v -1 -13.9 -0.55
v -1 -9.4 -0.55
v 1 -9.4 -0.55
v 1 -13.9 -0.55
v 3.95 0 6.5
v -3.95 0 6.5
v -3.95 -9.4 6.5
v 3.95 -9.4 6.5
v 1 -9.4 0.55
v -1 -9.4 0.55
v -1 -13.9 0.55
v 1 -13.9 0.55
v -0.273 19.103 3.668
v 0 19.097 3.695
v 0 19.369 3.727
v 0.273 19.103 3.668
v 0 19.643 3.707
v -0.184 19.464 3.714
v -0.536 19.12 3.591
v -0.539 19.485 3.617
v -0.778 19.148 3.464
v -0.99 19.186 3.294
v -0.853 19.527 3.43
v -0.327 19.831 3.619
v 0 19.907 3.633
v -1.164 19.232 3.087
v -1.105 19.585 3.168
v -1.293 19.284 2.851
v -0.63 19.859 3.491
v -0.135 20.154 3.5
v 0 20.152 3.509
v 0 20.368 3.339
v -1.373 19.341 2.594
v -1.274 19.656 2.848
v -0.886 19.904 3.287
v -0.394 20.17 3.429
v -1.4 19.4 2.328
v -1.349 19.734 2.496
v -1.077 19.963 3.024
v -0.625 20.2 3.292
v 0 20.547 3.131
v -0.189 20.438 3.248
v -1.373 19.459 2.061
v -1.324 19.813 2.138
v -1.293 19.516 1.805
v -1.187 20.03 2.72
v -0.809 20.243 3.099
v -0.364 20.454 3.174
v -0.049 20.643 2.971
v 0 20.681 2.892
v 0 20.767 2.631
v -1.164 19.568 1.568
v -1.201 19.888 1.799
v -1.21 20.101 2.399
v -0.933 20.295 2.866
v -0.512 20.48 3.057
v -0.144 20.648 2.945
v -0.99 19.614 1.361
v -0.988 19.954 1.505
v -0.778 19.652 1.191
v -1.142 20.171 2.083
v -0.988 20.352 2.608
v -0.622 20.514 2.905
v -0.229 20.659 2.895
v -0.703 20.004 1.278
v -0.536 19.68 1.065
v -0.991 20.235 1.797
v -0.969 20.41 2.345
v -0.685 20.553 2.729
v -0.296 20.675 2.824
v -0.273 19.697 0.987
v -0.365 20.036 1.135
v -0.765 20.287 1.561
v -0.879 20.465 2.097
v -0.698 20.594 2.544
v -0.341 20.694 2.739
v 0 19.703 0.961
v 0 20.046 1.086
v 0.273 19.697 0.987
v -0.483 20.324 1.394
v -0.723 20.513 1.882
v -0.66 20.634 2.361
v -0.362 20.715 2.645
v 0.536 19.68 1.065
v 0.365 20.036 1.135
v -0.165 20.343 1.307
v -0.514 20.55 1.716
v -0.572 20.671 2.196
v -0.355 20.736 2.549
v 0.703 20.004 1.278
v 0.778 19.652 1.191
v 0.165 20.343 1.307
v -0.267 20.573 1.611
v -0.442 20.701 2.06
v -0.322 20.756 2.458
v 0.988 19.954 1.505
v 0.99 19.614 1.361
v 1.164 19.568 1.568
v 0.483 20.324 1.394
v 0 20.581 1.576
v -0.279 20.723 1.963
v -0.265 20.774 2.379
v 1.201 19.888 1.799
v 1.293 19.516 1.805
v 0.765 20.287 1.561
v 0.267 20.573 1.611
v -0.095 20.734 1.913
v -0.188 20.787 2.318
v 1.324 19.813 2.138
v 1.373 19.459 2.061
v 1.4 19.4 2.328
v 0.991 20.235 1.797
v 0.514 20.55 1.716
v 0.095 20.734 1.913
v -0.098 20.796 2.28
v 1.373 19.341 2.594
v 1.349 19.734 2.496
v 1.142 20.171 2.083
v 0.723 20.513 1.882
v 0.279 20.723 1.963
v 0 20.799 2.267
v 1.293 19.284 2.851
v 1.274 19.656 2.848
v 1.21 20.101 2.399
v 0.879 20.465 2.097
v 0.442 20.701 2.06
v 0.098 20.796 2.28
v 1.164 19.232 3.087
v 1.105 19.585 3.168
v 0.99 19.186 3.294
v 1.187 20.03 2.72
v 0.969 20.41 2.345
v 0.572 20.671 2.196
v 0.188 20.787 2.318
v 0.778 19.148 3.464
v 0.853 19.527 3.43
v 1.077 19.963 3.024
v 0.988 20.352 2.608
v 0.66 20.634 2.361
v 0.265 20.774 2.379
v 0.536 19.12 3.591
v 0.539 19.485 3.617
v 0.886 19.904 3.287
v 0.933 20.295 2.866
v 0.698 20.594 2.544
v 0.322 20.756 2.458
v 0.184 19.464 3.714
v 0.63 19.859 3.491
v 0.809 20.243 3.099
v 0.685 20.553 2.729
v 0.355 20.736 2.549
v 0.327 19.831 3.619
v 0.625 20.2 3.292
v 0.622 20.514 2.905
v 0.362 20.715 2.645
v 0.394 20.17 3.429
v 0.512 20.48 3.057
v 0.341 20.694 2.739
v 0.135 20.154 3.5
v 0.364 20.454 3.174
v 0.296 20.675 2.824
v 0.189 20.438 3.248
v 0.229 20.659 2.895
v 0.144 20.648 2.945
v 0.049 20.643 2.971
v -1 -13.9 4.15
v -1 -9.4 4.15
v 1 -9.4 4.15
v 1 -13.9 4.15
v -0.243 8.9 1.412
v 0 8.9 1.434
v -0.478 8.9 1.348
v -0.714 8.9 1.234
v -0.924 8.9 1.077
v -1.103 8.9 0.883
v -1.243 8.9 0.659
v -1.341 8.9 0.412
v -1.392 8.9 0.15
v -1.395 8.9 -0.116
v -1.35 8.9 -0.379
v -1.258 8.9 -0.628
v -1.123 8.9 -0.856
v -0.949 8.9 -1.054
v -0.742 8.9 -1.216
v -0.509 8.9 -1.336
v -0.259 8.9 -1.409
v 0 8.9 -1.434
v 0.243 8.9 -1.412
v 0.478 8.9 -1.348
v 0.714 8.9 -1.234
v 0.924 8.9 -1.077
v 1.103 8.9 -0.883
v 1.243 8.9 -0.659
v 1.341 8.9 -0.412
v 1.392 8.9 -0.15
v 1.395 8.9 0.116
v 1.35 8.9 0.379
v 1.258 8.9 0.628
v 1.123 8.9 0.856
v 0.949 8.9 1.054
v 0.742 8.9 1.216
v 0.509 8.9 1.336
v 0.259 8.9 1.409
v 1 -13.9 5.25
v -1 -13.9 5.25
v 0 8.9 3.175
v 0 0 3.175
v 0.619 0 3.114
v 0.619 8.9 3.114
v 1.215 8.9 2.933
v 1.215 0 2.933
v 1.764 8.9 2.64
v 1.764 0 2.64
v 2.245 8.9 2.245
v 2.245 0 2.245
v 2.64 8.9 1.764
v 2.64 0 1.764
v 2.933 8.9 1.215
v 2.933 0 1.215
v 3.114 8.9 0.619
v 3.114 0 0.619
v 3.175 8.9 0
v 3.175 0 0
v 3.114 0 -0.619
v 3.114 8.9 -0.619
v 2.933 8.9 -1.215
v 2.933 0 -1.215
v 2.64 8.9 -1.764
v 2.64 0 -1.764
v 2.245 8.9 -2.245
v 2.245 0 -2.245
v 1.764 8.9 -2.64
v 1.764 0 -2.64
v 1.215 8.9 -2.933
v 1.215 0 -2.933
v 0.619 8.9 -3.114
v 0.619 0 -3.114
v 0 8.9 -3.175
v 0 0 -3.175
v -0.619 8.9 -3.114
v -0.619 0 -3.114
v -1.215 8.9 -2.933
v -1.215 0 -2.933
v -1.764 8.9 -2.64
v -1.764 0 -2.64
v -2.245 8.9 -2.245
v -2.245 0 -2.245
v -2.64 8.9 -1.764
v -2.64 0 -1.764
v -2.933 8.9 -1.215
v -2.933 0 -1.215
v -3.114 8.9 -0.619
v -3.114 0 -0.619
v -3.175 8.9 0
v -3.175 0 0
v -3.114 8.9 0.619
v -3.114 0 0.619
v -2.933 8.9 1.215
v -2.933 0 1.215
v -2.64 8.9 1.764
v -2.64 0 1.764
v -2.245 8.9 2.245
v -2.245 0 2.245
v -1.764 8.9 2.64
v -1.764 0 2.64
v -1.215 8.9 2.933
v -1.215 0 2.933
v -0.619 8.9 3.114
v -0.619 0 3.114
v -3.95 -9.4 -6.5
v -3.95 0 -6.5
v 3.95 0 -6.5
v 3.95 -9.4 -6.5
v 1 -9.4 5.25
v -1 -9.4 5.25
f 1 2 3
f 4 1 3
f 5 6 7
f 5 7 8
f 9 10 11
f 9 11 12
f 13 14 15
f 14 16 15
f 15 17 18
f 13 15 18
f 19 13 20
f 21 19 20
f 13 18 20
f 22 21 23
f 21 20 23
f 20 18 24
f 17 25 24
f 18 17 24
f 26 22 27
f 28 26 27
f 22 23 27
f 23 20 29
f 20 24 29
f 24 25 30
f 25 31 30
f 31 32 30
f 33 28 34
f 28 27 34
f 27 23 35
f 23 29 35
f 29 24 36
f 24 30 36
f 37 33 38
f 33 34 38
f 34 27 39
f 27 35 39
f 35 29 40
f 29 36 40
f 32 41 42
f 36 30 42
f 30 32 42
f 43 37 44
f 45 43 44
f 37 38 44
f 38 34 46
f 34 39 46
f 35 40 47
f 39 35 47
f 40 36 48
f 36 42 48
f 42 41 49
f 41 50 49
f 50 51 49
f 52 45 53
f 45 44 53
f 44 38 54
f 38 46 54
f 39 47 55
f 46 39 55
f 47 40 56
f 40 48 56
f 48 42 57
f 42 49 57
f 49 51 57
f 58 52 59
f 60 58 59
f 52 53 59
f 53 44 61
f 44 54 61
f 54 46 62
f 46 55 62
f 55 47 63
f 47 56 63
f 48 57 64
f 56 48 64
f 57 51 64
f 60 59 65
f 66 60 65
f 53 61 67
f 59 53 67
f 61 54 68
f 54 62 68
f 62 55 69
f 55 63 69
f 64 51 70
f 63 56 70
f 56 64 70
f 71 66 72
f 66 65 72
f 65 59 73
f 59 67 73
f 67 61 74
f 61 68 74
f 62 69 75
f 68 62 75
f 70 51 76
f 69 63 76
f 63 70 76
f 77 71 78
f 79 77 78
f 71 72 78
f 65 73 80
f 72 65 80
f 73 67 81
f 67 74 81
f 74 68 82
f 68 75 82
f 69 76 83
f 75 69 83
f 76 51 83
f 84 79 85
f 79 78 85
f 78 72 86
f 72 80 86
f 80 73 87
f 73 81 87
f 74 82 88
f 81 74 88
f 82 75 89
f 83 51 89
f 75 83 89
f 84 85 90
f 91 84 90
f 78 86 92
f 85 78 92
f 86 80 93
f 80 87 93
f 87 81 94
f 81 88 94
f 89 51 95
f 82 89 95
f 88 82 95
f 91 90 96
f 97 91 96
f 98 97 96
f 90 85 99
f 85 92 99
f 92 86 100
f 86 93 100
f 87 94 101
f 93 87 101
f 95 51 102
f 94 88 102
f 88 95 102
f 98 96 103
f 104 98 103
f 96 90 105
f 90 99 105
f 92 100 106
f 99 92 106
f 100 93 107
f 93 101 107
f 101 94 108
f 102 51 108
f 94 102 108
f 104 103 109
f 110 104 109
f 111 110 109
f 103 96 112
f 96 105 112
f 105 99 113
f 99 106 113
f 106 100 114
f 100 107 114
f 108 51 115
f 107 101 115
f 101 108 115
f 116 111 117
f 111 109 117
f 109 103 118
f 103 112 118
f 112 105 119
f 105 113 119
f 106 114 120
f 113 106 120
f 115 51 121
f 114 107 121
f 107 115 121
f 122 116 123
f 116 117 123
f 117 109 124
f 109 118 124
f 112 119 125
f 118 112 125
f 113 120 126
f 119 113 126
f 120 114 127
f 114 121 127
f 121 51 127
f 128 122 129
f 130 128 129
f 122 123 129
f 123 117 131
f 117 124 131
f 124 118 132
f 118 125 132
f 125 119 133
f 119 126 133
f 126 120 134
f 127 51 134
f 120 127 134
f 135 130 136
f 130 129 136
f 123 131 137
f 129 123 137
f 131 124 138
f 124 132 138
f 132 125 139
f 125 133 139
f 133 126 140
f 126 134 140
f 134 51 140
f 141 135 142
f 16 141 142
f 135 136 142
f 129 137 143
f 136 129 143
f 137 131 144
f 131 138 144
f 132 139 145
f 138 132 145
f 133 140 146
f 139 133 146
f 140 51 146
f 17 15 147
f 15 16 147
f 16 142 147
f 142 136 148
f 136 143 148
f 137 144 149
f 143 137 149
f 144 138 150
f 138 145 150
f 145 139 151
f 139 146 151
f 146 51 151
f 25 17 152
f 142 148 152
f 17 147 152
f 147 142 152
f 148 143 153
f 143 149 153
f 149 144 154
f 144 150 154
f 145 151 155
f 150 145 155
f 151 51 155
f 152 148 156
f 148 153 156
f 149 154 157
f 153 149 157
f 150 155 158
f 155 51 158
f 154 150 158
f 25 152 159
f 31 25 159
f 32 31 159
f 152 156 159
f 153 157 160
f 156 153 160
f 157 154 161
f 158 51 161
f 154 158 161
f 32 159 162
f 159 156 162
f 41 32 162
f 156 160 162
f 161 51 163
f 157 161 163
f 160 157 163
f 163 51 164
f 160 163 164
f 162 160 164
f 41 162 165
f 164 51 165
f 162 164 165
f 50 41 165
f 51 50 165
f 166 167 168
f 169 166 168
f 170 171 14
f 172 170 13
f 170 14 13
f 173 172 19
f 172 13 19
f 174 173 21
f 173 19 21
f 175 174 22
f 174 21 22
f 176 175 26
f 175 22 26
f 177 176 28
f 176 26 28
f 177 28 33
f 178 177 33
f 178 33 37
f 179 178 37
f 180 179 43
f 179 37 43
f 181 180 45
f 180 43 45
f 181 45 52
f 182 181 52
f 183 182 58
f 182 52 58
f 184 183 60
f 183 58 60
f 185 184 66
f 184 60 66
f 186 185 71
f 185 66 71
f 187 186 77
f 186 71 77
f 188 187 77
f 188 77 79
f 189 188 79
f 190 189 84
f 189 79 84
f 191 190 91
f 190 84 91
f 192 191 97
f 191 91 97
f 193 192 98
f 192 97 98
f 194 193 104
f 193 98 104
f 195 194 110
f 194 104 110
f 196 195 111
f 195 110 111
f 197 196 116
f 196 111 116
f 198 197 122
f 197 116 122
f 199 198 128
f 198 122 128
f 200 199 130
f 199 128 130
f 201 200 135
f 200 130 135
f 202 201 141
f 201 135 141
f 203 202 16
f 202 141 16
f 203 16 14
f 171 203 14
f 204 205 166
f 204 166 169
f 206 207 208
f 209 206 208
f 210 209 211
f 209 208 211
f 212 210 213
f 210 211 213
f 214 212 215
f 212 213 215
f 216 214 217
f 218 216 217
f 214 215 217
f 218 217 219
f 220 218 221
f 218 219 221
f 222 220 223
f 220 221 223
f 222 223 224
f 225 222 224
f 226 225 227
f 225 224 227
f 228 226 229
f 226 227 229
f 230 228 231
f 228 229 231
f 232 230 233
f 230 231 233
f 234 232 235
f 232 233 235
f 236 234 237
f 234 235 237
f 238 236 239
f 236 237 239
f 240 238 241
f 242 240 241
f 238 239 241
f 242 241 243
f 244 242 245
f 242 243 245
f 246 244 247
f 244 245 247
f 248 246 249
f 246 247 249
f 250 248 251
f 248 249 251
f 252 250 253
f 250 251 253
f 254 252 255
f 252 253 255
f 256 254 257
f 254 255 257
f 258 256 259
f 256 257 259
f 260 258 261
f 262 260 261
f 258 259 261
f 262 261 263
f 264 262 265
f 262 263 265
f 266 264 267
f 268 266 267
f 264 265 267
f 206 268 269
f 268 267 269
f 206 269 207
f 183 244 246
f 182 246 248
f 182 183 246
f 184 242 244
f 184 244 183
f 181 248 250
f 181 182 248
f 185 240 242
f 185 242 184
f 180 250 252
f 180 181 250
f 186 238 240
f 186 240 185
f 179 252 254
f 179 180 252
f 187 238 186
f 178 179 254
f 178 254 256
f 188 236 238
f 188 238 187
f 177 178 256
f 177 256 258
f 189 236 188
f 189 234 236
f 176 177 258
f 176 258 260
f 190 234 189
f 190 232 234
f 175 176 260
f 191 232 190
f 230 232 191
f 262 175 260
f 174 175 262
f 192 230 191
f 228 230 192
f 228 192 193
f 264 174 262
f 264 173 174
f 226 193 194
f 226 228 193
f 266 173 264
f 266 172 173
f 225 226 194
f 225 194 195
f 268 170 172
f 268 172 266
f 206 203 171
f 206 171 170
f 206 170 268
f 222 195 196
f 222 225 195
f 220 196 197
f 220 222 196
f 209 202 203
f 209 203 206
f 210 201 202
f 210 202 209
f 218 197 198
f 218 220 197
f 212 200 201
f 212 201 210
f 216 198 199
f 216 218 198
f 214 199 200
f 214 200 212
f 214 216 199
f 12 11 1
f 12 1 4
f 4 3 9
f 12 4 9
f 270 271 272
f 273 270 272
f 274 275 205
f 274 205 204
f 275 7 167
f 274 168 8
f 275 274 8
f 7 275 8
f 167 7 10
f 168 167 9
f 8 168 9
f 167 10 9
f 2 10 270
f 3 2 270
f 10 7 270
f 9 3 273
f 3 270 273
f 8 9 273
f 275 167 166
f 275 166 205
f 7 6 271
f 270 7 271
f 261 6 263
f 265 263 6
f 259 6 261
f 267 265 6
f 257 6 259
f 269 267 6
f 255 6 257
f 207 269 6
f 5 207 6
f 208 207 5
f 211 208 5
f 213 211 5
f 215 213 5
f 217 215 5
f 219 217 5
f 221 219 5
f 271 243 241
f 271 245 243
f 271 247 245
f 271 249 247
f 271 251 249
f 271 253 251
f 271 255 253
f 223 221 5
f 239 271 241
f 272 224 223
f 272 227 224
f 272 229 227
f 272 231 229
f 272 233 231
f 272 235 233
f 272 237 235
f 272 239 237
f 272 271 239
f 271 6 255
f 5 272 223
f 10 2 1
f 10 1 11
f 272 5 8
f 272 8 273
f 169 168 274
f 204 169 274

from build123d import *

# Parameters (mm, degrees)
SKETCH1_W           = 7.9
SKETCH1_H           = 13
BOSS_EXTRUDE1_DEPTH = 9.4
SKETCH2_W           = 2
SKETCH2_H           = 1.1
BOSS_EXTRUDE2_DEPTH = 4.5
SKETCH3_R           = 3.175
BOSS_EXTRUDE3_DEPTH = 8.9


with BuildPart() as part:
    # Sketch1 → Boss-Extrude1 (new body)
    with BuildSketch(Plane(origin=(0, 0, 0), x_dir=(1, 0, 0), z_dir=(0, 1, 0))):
        Rectangle(SKETCH1_W, SKETCH1_H)
    extrude(amount=-BOSS_EXTRUDE1_DEPTH)

    # Sketch2 → Boss-Extrude2 (add)
    with BuildSketch(Plane.XZ.offset(9.4)):
        with Locations((0, 4.7)):
            Rectangle(SKETCH2_W, SKETCH2_H)
        Rectangle(SKETCH2_W, SKETCH2_H)
    extrude(amount=BOSS_EXTRUDE2_DEPTH)

    # Sketch3 → Boss-Extrude3 (add)
    with BuildSketch(Plane(origin=(0, 0, 0), x_dir=(1, 0, 0), z_dir=(0, 1, 0))):
        with Locations(Location((0, 0, 0), (0, 0, 270))):
            Circle(SKETCH3_R)
    extrude(amount=BOSS_EXTRUDE3_DEPTH)

    # Sketch4 → Revolve1 (revolve)
    with BuildSketch(Plane(origin=(0, 0, 0), x_dir=(0, 0, -1), z_dir=(1, 0, 0)), mode=Mode.PRIVATE) as revolve1_sk:
        with BuildLine():
            Line((0, 8.9), (1.43399132, 8.9))
            Line((1.43399132, 8.9), (-0.960979548, 19.70301546))
            ThreePointArc((-0.960979548, 19.70301546), (-1.575574506, 20.580748024), (-2.630809417, 20.76681441))
            Line((-2.630809417, 20.76681441), (0, 8.9))
        make_face()
    revolve(revolve1_sk.sketch.rotate(Axis((0, 20.76681441, 2.630809417), (0, -0.9762960071199331, -0.21643961393810368)), 180), axis=Axis((0, 20.76681441, 2.630809417), (0, -0.9762960071199331, -0.21643961393810368)))


solid = part.part
